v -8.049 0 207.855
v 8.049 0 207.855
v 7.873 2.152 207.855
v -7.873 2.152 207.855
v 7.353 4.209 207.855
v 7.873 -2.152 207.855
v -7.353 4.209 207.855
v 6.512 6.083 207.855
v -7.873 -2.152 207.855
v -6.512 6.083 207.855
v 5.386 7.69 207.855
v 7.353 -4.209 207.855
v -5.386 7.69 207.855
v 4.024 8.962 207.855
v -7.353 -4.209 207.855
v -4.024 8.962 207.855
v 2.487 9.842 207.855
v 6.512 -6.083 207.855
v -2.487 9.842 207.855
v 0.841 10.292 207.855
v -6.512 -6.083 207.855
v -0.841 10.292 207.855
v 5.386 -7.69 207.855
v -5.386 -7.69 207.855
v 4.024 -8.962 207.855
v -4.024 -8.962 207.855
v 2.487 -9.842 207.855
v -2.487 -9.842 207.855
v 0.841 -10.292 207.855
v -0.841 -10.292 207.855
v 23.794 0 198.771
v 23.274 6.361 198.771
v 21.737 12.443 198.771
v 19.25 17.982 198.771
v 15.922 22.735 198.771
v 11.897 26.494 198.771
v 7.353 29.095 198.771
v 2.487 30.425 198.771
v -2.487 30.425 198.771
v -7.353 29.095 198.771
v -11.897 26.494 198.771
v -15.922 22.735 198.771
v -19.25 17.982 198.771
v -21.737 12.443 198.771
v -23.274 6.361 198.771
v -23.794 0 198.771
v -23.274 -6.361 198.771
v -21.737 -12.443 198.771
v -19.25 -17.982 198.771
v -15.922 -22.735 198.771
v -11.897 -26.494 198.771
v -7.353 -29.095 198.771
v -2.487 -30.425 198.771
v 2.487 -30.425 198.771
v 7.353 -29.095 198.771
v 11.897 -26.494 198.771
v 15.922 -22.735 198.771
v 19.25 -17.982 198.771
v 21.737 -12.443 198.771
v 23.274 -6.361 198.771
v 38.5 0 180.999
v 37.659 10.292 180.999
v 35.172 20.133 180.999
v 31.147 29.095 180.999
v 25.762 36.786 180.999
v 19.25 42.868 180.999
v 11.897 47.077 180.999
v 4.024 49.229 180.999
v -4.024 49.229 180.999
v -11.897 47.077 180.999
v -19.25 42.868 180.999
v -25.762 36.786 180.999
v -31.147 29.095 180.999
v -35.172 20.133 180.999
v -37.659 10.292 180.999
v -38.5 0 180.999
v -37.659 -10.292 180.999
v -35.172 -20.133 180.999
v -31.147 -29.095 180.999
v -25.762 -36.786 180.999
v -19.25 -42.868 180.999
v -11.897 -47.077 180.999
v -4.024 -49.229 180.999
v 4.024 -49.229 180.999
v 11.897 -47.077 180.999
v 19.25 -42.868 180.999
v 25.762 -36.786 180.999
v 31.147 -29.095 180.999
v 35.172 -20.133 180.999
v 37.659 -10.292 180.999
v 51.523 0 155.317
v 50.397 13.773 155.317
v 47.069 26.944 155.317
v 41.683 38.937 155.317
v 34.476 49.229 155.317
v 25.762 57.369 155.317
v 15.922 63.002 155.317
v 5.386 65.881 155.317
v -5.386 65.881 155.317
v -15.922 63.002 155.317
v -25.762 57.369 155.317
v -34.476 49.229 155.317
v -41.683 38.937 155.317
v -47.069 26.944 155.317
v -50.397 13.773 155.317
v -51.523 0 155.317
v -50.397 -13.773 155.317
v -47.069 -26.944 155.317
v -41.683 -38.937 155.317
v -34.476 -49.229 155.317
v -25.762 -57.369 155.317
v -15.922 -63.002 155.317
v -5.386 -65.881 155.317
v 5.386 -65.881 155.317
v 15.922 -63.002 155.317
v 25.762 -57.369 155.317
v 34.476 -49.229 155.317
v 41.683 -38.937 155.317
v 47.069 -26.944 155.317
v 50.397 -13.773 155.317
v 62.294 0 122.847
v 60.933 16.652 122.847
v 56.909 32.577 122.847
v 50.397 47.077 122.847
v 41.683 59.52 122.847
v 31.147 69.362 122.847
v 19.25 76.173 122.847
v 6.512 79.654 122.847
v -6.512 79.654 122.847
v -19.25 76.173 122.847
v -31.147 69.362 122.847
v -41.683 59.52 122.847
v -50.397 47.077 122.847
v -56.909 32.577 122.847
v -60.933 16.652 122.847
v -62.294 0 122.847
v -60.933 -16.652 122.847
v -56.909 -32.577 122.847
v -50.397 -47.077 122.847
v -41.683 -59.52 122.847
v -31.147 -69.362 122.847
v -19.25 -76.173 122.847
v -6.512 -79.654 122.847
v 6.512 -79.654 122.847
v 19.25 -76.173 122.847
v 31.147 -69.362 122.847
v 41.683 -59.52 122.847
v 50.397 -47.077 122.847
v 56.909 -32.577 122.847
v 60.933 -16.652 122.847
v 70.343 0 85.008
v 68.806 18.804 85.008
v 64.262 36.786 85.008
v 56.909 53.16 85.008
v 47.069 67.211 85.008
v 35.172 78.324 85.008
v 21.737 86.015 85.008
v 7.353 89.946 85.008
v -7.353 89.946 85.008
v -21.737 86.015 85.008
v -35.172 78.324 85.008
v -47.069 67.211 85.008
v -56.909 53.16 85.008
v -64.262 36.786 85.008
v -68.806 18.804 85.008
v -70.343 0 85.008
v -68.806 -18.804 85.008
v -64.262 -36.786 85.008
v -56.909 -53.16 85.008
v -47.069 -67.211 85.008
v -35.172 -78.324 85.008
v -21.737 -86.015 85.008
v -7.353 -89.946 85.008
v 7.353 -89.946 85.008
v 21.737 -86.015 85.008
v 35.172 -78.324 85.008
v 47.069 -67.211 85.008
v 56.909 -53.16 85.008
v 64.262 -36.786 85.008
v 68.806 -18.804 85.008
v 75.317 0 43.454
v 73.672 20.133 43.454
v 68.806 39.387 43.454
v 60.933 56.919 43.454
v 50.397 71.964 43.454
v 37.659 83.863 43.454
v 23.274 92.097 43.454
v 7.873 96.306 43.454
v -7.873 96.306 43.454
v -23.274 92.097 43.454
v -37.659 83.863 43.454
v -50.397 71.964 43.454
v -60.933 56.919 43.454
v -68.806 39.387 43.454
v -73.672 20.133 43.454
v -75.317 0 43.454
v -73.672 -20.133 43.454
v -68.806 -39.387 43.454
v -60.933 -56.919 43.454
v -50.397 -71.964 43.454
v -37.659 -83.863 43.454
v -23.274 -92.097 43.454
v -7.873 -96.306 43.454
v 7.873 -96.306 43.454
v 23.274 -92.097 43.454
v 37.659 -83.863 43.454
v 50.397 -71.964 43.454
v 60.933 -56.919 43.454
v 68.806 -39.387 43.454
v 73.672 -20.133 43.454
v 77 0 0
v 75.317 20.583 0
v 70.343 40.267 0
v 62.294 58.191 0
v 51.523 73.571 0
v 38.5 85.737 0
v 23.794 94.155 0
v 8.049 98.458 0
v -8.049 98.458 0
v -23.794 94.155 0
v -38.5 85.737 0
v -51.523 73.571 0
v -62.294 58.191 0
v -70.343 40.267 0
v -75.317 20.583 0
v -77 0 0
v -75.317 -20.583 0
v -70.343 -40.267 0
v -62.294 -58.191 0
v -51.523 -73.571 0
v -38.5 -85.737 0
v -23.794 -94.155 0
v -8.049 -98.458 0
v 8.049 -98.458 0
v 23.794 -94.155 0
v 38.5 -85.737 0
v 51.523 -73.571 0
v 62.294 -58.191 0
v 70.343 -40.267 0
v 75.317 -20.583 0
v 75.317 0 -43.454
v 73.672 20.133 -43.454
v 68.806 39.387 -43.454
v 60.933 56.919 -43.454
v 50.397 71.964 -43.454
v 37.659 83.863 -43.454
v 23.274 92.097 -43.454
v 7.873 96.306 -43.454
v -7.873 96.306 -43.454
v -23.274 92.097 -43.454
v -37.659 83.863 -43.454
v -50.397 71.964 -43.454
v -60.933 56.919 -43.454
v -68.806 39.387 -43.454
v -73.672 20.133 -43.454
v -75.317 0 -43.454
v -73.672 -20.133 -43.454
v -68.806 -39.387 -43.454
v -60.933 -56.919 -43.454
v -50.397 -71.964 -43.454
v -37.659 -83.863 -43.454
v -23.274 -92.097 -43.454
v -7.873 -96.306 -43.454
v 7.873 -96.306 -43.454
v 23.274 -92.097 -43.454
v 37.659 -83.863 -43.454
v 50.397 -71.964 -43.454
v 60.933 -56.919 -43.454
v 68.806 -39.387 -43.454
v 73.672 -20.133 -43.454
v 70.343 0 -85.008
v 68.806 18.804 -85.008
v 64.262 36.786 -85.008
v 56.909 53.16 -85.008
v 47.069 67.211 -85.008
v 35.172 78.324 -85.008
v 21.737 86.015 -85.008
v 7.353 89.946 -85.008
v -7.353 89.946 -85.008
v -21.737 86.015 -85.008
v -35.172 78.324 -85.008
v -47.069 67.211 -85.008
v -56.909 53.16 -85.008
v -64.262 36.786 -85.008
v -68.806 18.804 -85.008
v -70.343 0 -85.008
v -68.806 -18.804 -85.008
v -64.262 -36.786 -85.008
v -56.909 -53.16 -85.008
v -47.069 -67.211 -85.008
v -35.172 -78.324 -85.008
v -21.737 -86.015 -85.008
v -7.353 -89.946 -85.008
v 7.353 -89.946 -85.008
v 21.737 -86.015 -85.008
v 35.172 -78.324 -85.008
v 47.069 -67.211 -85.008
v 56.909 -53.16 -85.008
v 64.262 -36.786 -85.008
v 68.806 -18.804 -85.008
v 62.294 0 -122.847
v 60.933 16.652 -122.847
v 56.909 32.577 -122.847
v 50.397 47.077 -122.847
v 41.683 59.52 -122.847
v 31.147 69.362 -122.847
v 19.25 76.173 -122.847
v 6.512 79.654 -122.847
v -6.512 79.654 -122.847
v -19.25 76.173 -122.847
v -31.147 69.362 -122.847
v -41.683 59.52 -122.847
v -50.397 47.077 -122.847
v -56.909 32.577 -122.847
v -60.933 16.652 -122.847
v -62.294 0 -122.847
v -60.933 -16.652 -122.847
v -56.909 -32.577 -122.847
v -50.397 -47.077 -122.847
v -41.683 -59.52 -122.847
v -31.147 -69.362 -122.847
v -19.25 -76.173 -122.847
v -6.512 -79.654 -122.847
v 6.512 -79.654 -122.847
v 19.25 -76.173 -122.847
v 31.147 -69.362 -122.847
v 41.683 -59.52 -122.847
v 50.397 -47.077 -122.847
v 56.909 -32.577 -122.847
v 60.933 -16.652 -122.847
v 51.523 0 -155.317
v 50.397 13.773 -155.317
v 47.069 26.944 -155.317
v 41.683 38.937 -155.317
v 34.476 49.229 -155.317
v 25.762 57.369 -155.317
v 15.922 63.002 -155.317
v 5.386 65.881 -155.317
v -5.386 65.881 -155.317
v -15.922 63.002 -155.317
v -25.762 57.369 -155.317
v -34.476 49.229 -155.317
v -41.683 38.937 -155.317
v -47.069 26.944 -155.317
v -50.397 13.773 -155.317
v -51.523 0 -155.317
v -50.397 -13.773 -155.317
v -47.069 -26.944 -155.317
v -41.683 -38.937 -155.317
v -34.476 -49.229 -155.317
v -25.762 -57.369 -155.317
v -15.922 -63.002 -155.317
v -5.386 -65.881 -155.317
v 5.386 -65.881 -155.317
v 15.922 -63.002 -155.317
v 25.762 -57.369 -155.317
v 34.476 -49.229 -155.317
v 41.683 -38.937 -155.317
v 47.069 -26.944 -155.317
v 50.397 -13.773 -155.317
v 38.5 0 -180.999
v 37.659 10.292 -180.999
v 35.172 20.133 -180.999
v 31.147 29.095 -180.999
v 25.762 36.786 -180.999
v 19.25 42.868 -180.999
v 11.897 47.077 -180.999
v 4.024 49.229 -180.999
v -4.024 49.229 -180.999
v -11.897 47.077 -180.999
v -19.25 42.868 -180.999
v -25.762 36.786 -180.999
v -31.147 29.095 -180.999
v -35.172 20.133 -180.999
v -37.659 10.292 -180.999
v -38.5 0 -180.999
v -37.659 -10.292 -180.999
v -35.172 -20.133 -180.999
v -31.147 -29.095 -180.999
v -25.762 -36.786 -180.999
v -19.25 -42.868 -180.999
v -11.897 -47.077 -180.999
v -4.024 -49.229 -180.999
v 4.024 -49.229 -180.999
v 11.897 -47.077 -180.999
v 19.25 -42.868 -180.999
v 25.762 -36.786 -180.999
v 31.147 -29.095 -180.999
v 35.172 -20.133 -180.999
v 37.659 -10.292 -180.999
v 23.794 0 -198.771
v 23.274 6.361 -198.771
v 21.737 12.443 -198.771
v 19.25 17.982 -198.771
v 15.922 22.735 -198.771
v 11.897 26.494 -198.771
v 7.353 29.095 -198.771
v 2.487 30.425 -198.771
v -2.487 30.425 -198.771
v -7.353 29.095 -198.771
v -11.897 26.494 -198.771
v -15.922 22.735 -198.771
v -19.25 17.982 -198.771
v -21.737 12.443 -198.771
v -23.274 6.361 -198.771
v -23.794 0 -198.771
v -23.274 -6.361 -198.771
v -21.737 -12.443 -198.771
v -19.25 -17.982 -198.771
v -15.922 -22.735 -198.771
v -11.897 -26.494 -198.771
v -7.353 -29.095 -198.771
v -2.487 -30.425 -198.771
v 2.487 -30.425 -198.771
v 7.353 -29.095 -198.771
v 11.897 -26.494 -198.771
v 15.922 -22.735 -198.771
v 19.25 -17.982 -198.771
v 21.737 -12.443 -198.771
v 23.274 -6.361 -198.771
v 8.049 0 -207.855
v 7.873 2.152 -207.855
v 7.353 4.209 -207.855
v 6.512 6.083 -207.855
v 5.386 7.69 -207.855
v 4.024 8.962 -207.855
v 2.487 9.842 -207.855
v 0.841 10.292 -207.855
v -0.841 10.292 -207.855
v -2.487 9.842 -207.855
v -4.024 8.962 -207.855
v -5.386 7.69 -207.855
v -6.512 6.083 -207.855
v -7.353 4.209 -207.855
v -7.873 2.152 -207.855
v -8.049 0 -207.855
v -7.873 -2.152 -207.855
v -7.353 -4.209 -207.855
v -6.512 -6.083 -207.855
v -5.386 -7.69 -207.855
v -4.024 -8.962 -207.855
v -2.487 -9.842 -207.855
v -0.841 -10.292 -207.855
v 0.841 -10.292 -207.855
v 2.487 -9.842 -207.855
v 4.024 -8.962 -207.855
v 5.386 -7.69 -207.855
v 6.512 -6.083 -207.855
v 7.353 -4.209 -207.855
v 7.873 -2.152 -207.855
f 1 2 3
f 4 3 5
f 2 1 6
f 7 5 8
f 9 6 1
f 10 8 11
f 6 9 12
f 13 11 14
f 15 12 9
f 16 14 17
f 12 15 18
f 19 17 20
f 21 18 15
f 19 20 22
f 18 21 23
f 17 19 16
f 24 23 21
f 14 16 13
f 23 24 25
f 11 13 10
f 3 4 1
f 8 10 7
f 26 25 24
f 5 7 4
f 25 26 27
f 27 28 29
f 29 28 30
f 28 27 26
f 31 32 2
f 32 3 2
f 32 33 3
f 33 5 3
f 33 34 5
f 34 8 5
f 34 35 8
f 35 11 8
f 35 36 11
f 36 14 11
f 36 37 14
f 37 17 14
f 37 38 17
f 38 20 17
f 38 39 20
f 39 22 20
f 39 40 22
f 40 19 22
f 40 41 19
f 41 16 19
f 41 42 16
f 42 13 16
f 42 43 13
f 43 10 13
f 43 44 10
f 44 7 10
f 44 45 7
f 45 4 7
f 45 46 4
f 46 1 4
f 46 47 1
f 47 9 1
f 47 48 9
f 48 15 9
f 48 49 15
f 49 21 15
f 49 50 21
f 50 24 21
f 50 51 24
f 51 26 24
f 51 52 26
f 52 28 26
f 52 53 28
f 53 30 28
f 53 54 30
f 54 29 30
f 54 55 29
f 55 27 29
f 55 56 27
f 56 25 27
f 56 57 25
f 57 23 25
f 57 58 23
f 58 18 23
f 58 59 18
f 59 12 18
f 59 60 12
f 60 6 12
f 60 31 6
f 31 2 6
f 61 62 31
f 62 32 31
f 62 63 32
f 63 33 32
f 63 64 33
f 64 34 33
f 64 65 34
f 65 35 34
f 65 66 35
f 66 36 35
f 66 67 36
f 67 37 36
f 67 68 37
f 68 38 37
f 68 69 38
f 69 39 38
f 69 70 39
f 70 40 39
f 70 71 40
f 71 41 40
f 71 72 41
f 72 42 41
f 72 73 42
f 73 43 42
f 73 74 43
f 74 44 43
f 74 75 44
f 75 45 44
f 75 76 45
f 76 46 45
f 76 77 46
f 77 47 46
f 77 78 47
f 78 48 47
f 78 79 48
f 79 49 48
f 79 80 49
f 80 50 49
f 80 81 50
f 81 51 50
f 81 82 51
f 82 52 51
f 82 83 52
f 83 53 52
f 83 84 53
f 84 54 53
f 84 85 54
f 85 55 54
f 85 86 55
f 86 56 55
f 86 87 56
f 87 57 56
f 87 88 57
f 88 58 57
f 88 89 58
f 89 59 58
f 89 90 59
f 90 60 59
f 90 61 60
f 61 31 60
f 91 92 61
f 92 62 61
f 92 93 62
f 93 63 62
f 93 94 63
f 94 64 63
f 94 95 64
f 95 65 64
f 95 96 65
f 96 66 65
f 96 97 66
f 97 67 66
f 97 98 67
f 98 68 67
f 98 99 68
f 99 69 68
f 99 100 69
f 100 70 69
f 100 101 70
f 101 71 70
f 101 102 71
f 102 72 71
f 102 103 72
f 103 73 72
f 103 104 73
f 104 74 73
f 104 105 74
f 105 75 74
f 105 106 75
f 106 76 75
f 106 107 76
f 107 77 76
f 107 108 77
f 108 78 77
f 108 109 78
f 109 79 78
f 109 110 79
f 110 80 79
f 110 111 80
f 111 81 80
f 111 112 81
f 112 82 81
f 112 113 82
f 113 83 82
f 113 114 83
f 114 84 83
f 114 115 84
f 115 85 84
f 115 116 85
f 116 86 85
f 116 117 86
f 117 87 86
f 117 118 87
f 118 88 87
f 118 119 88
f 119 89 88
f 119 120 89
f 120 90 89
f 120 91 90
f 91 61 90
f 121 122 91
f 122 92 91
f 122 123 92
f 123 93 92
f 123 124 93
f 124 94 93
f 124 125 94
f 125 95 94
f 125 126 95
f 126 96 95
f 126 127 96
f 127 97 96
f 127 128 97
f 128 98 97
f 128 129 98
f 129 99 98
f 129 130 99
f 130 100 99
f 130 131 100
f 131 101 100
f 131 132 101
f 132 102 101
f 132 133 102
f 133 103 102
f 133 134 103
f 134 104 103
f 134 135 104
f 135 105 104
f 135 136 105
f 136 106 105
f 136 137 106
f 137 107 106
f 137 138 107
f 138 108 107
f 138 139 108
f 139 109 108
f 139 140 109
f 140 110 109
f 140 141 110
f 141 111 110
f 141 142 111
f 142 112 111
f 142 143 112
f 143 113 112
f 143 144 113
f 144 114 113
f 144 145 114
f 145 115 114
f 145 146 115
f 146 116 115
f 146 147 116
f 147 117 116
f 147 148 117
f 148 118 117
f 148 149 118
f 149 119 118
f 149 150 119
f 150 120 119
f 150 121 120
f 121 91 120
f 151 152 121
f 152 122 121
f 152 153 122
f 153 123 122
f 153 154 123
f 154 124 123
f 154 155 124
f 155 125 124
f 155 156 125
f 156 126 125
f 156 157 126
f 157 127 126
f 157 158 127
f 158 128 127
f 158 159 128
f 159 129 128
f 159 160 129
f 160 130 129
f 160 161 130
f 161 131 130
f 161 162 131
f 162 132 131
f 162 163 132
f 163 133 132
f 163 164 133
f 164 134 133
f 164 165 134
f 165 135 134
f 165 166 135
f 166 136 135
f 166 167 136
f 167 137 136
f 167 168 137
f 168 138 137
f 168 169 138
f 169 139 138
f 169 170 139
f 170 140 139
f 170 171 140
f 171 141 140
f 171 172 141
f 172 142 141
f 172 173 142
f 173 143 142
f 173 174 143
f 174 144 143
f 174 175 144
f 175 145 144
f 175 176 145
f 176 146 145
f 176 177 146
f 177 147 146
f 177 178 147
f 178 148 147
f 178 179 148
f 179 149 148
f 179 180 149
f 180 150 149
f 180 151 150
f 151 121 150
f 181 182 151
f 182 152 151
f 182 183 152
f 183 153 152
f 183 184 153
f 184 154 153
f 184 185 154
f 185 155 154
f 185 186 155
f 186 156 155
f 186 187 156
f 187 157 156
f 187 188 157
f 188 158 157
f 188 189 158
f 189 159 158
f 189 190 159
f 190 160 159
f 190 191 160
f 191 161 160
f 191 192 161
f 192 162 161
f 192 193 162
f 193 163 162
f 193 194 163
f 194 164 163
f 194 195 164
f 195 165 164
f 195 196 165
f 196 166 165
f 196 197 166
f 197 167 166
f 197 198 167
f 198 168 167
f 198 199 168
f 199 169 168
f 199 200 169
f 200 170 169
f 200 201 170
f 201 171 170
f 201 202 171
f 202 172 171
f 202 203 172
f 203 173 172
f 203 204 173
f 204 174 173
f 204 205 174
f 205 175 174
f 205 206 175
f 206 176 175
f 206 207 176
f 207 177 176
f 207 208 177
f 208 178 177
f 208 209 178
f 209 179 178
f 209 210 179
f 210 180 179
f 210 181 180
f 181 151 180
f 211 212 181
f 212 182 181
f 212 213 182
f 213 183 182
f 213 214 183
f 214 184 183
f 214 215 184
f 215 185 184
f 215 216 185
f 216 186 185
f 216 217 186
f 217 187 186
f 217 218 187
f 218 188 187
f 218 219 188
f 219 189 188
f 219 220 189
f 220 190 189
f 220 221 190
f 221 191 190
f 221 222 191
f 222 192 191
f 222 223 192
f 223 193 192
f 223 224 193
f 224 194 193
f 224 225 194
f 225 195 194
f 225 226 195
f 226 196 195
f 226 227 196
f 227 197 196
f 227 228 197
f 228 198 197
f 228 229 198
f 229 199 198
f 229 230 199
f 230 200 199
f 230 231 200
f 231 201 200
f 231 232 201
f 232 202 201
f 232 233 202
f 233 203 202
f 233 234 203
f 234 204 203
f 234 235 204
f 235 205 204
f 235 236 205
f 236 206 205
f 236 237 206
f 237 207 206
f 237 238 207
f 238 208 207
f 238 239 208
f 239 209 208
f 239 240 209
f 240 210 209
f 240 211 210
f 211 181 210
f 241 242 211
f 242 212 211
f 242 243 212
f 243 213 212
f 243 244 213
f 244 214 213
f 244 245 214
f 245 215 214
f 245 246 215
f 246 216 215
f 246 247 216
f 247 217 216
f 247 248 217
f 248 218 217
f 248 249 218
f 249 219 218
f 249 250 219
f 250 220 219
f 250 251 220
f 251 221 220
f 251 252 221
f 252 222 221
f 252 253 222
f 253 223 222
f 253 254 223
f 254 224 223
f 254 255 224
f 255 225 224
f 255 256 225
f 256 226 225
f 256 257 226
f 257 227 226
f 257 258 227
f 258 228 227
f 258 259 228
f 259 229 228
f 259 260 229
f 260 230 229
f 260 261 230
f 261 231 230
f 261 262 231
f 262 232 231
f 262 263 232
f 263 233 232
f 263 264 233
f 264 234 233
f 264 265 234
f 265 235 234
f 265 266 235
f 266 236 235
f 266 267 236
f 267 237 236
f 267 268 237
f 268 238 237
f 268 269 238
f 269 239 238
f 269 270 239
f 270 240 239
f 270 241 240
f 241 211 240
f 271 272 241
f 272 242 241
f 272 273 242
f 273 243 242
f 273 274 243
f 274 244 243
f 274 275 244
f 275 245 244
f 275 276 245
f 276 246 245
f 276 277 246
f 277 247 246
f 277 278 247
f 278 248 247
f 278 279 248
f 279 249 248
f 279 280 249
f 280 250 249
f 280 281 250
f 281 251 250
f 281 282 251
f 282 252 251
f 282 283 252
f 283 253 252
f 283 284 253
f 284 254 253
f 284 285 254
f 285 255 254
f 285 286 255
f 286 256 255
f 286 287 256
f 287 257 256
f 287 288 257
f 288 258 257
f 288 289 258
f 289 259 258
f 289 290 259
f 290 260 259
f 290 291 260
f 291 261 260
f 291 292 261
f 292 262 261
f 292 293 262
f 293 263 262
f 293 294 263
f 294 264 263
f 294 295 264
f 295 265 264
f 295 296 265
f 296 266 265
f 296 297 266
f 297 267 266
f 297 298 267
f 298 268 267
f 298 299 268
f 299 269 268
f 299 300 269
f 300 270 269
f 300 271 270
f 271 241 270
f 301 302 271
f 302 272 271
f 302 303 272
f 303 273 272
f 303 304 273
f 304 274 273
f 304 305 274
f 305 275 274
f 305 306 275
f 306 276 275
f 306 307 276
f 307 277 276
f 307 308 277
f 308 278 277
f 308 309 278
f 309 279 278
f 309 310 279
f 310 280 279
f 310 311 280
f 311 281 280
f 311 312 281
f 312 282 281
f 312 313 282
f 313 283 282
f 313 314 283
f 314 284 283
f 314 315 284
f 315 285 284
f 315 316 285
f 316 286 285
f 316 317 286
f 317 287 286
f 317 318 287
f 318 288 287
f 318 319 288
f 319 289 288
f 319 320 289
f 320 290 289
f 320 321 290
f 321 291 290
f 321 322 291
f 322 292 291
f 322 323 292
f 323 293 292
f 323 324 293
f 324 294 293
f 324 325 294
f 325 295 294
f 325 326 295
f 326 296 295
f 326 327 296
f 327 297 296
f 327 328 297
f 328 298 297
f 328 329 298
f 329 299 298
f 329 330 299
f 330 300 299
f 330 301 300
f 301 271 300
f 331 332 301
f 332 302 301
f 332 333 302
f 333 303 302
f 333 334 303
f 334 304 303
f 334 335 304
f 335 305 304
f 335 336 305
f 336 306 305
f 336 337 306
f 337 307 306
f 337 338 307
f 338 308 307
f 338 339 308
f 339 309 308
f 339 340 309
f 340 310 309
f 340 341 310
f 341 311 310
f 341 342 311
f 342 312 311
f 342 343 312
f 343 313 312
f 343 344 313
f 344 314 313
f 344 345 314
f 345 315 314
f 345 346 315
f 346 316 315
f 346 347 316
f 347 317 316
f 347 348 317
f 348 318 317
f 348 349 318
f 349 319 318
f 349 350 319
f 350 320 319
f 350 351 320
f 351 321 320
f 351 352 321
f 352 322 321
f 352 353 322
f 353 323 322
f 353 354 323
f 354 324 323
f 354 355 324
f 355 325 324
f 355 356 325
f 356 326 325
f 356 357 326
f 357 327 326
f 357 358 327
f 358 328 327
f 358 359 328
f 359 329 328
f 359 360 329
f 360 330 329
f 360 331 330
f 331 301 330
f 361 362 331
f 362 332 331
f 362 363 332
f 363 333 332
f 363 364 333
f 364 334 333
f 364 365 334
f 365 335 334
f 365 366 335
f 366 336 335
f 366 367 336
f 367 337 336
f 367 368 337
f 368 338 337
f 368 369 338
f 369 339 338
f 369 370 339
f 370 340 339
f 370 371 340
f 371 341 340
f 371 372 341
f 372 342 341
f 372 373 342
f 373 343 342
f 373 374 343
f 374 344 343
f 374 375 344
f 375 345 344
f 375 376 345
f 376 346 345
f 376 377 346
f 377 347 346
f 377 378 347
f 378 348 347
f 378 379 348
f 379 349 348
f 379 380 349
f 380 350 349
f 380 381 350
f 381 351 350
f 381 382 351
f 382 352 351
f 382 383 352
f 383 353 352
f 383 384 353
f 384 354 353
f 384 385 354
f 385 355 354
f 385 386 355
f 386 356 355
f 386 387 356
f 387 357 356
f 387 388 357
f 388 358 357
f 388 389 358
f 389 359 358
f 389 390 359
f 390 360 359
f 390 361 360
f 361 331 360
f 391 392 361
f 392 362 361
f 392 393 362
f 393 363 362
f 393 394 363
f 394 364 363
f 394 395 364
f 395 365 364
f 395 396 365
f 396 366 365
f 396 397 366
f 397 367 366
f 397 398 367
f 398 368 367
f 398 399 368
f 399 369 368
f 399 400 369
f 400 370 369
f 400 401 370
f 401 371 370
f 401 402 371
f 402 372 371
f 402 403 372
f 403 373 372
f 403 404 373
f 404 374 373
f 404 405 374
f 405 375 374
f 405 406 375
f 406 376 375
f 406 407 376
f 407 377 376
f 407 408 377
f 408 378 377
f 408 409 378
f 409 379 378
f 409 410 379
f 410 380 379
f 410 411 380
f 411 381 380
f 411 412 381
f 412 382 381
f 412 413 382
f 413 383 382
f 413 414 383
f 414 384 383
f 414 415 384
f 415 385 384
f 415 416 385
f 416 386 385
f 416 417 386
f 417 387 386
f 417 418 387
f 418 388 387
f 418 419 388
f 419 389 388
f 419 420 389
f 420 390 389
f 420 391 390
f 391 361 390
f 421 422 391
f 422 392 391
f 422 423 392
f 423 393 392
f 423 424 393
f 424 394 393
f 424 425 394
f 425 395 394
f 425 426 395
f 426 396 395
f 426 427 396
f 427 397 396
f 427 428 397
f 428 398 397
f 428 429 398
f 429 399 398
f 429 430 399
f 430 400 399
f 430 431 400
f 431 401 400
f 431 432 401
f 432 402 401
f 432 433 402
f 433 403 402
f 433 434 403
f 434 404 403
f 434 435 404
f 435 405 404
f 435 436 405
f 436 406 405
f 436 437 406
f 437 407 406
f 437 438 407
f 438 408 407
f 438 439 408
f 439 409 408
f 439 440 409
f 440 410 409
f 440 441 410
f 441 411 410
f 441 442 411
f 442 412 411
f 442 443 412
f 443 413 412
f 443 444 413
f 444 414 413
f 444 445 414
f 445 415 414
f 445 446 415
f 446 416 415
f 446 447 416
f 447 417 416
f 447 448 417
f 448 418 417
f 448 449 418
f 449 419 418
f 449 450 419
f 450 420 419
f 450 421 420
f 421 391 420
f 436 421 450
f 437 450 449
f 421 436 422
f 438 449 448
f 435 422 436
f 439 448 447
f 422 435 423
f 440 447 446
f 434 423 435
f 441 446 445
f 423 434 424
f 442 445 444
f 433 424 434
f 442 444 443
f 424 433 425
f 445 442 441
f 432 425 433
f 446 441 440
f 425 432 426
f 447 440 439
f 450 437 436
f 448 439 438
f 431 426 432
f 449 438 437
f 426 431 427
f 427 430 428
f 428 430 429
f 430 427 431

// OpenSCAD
// Generated by SolidPython 1.0.1 on 2020-07-29 00:46:47


scale(v = [7, 9, 19]) {
	sphere(r = 11);
}
/***********************************************
*********      SolidPython code:      **********
************************************************
 
# import packages: SolidPython
from solid import *
from solid.utils import *
from itertools import chain, combinations, permutations


class Resize:

    def __init__(self, scad_file):
        self.scad_file = scad_file
        #self.scad_file = import_scad(scad_file)
        # cone/cylinder param:
        self.r1 = 0
        self.r2 = 0
        self.h = 0
        # rectangular prism param:
        self.w = 0
        self.l = 0
        # ellipse param:
        self.r = 0

    # import OpenScad code (file name corresponds to shape)


    # classify shape + parameters
    def assign(self, param1, param2, param3):
        if self.scad_file == 'cone.scad':
            self.r1 = param1
            self.r2 = param2
            self.h = param3
        elif self.scad_file == 'cylinder.scad':
            self.r1 = param1
            self.r2 = param2
            self.h = param3
        elif self.scad_file == 'rectangularPrism.scad':
            self.h = param1
            self.l = param2
            self.w = param3
        else:
            self.r = param1
            self.h = param2

    # resize parameters
    def iterate(self):
        x = range(3, 20, 2)
        i = 1
        if self.scad_file == 'cone.scad':
            tempList = list(permutations(x, 2))
            for temp in tempList:
                param1 = temp[0]
                param2 = temp[1]
                filepath = 'produced_scad_files/' + 'cone' + str(param1) + '_' + str(param2) + '_' + '.scad'
                scad_render_to_file(cylinder(h=param1, r1=param2, r2=0), filepath)

        elif self.scad_file == 'cylinder.scad':
            tempList = list(permutations(x, 3))
            for temp in tempList:
                param1 = temp[0]
                param2 = temp[1]
                filepath = 'produced_scad_files/' + 'cylinder' + str(param1) + '_' + str(param2) + '_' + '.scad'
                scad_render_to_file(cylinder(h=param1, r1=param2, r2=param2), filepath)

        elif self.scad_file == 'rectangularPrism.scad':
            tempList = list(permutations(x, 3))
            for temp in tempList:
                param1 = temp[0]
                param2 = temp[1]
                param3 = temp[2]
                filepath = 'produced_scad_files/' + 'rectangularPrism' + str(param1) + '_' + str(param2) + '_' + str(
                    param3) + '.scad'
                scad_render_to_file(cube(size=(param1, param2, param3)), filepath)

        elif self.scad_file == 'ellipse.scad':
            tempList = list(permutations(x, 4))
            for temp in tempList:
                param1 = temp[0]
                param2 = temp[1]
                param3 = temp[2]
                param4 = temp[3]
                filepath = 'produced_scad_files/' + 'ellipse' + str(param1) + '_' + str(param2) + '_' + str(param3) + '_' + str(param4) + '.scad'
                scad_render_to_file(scale([param1, param2, param3])(sphere(r=param4)), filepath)

    def render_to_scadfile(self):
        scad_render_to_file(scad, 'example.scad') 
 
************************************************/
